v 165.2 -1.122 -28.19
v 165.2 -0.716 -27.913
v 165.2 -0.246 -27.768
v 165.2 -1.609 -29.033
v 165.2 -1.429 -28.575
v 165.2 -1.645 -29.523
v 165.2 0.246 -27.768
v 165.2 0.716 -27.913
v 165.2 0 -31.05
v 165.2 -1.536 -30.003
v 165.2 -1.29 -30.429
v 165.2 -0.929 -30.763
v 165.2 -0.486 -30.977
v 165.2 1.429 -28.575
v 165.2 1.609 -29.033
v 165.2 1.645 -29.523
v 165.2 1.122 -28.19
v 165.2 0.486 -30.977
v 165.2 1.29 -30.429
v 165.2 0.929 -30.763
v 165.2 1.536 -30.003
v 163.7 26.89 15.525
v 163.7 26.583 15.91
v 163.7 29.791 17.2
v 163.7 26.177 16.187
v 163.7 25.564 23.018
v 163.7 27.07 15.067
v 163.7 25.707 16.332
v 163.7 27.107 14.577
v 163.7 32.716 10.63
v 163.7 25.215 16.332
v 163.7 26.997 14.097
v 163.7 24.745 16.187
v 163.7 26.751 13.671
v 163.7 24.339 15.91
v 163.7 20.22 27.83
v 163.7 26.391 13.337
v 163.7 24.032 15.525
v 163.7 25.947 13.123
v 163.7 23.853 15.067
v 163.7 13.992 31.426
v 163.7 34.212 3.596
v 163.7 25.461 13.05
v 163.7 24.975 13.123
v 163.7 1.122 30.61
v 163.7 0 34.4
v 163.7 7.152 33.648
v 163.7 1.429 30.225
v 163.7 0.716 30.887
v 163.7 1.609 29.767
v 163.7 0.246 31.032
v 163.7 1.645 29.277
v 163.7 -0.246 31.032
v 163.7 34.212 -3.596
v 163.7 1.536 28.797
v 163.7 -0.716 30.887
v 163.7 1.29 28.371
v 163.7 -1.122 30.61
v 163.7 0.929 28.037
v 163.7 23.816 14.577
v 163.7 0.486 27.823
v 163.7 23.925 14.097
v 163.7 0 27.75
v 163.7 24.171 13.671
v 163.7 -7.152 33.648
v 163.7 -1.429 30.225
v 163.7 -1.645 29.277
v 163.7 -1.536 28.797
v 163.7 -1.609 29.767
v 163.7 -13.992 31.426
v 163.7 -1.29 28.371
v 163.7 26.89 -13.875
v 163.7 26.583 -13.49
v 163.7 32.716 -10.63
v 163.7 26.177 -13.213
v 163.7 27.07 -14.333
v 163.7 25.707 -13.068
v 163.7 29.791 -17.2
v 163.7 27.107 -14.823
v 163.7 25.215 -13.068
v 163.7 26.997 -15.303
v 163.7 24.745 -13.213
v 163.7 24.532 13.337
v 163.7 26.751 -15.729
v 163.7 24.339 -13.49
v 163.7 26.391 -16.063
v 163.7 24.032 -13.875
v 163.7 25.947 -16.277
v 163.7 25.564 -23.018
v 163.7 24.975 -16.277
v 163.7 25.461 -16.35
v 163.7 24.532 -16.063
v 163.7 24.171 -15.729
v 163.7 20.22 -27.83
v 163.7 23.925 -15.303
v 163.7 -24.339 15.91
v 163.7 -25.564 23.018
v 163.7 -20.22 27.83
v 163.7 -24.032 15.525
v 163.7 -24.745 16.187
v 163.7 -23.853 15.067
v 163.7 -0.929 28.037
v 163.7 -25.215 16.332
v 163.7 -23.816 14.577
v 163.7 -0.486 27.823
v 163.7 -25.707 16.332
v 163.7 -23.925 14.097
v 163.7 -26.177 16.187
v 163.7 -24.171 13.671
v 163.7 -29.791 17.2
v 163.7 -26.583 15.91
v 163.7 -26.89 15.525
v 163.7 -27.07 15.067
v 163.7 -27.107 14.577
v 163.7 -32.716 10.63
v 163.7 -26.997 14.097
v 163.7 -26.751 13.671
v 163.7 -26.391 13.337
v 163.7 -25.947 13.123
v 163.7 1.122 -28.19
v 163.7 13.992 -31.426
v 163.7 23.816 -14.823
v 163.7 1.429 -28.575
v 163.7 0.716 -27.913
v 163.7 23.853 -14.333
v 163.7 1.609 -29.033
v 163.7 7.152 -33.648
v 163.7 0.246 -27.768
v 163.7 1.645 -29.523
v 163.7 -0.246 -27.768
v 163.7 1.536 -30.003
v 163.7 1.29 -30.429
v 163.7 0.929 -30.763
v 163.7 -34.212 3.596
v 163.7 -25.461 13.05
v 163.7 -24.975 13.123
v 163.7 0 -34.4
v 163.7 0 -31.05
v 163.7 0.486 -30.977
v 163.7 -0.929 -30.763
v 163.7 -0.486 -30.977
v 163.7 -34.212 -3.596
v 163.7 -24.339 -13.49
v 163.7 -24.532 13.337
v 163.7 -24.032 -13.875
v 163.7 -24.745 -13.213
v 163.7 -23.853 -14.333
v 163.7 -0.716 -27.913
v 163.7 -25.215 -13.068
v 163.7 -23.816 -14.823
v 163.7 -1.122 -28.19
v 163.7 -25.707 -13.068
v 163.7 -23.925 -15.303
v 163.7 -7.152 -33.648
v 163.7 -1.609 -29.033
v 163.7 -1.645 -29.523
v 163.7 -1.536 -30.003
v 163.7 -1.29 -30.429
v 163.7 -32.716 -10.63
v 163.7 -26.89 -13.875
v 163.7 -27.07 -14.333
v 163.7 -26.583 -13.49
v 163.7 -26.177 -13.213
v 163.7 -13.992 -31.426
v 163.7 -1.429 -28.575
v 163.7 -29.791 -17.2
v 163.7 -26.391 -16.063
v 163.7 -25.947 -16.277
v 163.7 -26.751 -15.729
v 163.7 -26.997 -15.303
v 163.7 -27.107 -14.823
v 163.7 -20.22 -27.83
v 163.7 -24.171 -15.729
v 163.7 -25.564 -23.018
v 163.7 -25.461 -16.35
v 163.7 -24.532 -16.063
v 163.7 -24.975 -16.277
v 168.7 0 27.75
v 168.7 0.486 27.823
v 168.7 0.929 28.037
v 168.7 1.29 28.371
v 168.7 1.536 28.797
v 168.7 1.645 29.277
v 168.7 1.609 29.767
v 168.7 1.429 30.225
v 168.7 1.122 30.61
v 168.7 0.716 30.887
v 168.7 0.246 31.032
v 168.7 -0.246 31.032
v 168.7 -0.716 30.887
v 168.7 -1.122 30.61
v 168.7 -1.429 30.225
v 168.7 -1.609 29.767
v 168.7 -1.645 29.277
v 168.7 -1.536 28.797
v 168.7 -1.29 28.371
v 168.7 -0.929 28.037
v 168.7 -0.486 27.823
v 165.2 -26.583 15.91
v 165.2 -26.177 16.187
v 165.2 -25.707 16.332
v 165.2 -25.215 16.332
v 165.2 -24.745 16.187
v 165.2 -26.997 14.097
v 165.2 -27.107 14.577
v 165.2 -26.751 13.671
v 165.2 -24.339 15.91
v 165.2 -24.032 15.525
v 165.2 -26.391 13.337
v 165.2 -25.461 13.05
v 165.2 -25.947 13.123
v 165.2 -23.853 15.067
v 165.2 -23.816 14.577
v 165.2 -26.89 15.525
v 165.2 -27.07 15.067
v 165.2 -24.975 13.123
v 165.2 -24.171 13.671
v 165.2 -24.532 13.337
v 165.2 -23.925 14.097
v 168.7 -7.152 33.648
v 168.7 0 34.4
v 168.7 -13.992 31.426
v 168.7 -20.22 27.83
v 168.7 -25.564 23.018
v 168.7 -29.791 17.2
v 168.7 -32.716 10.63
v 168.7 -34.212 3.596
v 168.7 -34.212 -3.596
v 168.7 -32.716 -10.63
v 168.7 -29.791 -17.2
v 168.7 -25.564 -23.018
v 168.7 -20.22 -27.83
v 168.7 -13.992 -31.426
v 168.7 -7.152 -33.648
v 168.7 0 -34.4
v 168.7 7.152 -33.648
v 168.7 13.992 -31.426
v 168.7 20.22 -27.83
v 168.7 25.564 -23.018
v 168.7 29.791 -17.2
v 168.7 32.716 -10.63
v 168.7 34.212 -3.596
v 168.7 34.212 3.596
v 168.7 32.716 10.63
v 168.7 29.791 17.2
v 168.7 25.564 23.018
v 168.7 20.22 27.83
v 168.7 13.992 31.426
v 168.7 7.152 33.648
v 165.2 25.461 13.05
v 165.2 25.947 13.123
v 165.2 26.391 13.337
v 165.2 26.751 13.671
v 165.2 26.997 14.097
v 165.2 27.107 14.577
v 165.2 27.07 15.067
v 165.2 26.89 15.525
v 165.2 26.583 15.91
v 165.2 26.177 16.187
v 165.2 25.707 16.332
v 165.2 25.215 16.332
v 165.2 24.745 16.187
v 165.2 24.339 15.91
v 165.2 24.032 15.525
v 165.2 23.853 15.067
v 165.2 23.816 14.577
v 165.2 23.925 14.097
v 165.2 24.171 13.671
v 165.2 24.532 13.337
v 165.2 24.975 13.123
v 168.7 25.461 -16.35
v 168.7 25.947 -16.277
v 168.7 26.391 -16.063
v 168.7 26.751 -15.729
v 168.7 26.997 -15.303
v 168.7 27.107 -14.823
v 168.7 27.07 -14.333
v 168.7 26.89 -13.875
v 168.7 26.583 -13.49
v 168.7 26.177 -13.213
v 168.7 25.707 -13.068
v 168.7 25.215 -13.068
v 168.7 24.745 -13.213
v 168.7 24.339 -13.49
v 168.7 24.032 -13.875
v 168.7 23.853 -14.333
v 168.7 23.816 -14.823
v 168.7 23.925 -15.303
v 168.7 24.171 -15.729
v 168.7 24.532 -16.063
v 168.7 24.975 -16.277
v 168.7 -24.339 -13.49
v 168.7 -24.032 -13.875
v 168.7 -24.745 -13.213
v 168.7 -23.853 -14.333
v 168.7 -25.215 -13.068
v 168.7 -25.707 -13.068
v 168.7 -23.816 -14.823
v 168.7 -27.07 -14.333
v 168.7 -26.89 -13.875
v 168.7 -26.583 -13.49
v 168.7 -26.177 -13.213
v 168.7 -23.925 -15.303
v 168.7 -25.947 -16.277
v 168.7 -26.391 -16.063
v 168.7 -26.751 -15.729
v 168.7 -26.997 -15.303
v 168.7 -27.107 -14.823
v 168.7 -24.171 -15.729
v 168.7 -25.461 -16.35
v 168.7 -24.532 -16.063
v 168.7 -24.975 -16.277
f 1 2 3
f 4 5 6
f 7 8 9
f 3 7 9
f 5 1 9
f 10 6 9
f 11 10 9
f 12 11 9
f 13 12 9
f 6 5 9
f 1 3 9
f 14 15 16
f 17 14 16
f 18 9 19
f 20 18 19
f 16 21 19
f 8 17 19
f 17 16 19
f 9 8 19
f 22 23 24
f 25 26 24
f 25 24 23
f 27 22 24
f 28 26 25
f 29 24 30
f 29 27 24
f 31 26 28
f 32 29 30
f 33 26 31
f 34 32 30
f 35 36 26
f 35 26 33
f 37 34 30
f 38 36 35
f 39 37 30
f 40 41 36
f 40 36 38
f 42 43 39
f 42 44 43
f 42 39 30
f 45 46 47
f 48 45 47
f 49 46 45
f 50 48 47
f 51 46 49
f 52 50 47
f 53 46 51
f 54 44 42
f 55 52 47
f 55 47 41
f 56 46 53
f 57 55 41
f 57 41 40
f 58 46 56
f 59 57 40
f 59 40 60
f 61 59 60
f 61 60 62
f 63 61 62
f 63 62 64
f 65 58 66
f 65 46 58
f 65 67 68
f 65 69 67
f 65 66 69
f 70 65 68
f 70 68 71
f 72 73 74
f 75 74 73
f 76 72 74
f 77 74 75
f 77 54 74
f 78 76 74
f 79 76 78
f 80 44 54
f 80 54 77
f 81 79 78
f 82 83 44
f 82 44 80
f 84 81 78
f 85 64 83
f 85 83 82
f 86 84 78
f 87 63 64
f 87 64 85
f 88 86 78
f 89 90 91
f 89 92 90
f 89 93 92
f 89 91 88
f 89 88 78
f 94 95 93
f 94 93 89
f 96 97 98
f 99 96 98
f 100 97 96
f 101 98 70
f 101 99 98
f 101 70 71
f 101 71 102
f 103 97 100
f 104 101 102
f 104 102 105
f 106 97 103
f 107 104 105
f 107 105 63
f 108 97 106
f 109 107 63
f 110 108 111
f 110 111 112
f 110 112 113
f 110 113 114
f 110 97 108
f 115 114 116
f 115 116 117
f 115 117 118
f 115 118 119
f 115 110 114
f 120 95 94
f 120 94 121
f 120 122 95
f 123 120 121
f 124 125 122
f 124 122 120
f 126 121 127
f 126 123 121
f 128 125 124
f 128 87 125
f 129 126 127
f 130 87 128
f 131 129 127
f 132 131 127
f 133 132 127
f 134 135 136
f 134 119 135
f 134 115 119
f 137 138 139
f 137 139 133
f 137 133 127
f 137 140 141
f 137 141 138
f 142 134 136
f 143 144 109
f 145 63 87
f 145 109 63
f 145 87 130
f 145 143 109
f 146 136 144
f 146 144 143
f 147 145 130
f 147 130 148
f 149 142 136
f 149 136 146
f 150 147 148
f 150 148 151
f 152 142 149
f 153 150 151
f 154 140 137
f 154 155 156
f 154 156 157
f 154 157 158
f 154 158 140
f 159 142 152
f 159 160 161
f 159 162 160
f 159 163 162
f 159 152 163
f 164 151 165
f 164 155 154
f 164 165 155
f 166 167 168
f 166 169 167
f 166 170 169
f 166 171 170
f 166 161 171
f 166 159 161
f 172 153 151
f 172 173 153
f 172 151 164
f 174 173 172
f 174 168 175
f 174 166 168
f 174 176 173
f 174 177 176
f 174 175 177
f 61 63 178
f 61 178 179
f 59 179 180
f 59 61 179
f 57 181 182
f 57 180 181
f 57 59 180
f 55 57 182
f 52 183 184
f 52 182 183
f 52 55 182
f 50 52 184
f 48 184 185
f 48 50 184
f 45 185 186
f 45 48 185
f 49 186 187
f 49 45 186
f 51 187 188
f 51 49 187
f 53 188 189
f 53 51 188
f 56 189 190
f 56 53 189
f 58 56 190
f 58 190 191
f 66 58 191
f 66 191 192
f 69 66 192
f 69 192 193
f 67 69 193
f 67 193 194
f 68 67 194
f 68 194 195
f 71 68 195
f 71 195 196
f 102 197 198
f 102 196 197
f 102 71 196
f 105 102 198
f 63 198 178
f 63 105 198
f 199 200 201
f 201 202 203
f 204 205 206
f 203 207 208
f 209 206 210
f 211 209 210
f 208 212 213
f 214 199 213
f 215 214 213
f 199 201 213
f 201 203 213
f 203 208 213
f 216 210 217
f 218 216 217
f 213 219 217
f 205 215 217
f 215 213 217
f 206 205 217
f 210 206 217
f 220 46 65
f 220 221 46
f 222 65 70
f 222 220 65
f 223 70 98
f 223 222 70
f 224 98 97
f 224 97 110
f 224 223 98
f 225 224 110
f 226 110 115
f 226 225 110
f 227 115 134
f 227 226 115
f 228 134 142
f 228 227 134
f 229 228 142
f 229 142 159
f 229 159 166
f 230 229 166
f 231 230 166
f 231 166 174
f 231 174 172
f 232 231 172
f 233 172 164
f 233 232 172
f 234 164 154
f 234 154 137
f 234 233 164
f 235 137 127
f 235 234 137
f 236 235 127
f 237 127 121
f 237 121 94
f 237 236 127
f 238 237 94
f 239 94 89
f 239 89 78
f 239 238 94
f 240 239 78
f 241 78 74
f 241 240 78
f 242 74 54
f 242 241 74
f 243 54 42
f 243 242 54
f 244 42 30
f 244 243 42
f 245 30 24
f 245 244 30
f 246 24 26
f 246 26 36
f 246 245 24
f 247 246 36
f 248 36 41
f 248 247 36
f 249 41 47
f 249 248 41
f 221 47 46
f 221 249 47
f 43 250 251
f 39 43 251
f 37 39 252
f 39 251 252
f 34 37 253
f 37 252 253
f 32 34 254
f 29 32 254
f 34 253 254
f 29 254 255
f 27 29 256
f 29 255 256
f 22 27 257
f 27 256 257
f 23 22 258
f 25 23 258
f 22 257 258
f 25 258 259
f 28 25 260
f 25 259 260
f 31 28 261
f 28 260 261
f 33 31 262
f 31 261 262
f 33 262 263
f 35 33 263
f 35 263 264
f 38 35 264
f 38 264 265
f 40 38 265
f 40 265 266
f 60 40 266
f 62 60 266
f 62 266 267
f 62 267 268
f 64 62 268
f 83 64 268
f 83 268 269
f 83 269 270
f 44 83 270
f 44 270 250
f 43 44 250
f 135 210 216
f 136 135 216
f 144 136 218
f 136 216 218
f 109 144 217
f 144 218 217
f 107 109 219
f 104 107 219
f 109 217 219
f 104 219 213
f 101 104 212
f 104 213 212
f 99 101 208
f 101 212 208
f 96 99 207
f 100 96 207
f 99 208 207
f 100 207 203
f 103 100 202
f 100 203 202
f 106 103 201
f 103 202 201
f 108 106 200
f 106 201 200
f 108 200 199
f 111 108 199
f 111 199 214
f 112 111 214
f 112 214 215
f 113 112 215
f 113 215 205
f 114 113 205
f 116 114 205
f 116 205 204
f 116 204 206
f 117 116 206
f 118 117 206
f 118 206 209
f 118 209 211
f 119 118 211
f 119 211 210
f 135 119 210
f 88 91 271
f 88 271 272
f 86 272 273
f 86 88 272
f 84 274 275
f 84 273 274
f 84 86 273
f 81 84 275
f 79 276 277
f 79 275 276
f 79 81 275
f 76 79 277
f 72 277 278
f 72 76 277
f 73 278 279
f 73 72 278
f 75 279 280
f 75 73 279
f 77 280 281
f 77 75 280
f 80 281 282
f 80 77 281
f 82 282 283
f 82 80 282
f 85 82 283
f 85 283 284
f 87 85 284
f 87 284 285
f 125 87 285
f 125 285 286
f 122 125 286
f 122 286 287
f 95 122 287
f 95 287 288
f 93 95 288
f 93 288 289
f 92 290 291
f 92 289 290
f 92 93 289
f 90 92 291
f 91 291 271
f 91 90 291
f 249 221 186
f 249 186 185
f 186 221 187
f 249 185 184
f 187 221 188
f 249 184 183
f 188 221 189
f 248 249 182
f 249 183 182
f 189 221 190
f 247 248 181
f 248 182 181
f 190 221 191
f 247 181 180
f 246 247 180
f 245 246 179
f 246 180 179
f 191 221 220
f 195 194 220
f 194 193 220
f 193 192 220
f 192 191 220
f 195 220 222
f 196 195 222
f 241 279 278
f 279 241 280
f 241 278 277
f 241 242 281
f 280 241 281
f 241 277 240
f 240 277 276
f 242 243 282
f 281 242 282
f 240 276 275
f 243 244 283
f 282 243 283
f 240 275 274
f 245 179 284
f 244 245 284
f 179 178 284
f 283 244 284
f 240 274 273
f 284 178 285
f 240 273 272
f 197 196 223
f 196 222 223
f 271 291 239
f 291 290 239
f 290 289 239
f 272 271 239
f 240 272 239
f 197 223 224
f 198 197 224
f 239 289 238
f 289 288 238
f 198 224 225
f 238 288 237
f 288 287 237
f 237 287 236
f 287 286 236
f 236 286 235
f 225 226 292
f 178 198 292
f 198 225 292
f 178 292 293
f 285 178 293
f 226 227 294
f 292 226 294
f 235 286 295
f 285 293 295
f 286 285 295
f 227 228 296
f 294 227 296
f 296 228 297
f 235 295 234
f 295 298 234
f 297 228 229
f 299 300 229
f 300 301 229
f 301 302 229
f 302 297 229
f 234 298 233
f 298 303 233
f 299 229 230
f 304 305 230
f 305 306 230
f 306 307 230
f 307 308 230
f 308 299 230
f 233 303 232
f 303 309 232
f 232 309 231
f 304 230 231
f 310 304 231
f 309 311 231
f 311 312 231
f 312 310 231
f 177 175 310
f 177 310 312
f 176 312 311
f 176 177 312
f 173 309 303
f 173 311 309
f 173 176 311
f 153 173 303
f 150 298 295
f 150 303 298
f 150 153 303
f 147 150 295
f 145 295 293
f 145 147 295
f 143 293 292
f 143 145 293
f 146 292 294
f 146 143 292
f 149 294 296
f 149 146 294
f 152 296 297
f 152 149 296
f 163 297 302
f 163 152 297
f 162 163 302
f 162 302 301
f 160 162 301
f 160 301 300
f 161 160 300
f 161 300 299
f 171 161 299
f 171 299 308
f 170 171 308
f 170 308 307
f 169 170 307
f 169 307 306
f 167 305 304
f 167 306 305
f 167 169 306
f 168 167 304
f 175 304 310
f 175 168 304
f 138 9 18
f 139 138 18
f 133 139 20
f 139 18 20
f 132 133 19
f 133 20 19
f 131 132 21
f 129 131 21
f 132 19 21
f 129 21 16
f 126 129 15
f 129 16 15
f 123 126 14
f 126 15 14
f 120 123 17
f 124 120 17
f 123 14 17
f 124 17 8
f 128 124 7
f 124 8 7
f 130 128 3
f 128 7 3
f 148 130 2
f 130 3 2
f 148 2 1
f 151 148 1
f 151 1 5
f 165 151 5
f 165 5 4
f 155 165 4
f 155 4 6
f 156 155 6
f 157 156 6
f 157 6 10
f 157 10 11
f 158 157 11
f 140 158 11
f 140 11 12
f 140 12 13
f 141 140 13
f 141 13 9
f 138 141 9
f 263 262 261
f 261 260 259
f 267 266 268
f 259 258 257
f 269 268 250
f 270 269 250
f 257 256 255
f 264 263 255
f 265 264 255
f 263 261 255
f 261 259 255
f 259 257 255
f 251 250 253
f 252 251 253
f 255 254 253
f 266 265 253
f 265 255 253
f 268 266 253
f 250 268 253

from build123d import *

# Parameters (mm, degrees)
AXIAL_PROFILE_MM_W     = 5
AXIAL_PROFILE_MM_H     = 34.4
AXIAL_HOLES_DEPTH      = 176.574514096
AXIAL_HOLES_DEPTH_BACK = 176.574514096
SKETCH2_R              = 1.65
CUT_EXTRUDE2_START     = 165.2
SKETCH3_R              = 1.65
CUT_EXTRUDE2_DEPTH     = 3.5


with BuildPart() as part:
    # Axial profile (mm) → Full revolution (revolve)
    with BuildSketch(Plane.XY, mode=Mode.PRIVATE) as full_revolution_sk:
        with Locations((166.2, 17.2)):
            Rectangle(AXIAL_PROFILE_MM_W, AXIAL_PROFILE_MM_H)
    revolve(full_revolution_sk.sketch.rotate(Axis((-110, 0, 0), (1, 0, 0)), 90), axis=Axis((-110, 0, 0), (1, 0, 0)))

    # Sketch2 → Axial holes (cut, two sides: drawn at the far end of the back side and taken through both)
    with BuildSketch(Plane(origin=(0, 0, 0), x_dir=(0, 0, -1), z_dir=(1, 0, 0)).offset(-AXIAL_HOLES_DEPTH_BACK)):
        with Locations((-29.4, 0)):
            Circle(SKETCH2_R)
        with Locations((14.7, -25.461146871)):
            Circle(SKETCH2_R)
        with Locations((14.7, 25.461146871)):
            Circle(SKETCH2_R)
    extrude(amount=AXIAL_HOLES_DEPTH + AXIAL_HOLES_DEPTH_BACK, mode=Mode.SUBTRACT)

    # Sketch3 → Cut-Extrude2 (cut)
    with BuildSketch(Plane(origin=(0, 0, 0), x_dir=(0, 0, -1), z_dir=(1, 0, 0)).offset(CUT_EXTRUDE2_START)):
        with Locations((29.4, 0)):
            Circle(SKETCH3_R)
        with Locations((-14.7, 25.461146871)):
            Circle(SKETCH3_R)
        with Locations((-14.7, -25.461146871)):
            Circle(SKETCH3_R)
    extrude(amount=-CUT_EXTRUDE2_DEPTH, mode=Mode.SUBTRACT)


solid = part.part
